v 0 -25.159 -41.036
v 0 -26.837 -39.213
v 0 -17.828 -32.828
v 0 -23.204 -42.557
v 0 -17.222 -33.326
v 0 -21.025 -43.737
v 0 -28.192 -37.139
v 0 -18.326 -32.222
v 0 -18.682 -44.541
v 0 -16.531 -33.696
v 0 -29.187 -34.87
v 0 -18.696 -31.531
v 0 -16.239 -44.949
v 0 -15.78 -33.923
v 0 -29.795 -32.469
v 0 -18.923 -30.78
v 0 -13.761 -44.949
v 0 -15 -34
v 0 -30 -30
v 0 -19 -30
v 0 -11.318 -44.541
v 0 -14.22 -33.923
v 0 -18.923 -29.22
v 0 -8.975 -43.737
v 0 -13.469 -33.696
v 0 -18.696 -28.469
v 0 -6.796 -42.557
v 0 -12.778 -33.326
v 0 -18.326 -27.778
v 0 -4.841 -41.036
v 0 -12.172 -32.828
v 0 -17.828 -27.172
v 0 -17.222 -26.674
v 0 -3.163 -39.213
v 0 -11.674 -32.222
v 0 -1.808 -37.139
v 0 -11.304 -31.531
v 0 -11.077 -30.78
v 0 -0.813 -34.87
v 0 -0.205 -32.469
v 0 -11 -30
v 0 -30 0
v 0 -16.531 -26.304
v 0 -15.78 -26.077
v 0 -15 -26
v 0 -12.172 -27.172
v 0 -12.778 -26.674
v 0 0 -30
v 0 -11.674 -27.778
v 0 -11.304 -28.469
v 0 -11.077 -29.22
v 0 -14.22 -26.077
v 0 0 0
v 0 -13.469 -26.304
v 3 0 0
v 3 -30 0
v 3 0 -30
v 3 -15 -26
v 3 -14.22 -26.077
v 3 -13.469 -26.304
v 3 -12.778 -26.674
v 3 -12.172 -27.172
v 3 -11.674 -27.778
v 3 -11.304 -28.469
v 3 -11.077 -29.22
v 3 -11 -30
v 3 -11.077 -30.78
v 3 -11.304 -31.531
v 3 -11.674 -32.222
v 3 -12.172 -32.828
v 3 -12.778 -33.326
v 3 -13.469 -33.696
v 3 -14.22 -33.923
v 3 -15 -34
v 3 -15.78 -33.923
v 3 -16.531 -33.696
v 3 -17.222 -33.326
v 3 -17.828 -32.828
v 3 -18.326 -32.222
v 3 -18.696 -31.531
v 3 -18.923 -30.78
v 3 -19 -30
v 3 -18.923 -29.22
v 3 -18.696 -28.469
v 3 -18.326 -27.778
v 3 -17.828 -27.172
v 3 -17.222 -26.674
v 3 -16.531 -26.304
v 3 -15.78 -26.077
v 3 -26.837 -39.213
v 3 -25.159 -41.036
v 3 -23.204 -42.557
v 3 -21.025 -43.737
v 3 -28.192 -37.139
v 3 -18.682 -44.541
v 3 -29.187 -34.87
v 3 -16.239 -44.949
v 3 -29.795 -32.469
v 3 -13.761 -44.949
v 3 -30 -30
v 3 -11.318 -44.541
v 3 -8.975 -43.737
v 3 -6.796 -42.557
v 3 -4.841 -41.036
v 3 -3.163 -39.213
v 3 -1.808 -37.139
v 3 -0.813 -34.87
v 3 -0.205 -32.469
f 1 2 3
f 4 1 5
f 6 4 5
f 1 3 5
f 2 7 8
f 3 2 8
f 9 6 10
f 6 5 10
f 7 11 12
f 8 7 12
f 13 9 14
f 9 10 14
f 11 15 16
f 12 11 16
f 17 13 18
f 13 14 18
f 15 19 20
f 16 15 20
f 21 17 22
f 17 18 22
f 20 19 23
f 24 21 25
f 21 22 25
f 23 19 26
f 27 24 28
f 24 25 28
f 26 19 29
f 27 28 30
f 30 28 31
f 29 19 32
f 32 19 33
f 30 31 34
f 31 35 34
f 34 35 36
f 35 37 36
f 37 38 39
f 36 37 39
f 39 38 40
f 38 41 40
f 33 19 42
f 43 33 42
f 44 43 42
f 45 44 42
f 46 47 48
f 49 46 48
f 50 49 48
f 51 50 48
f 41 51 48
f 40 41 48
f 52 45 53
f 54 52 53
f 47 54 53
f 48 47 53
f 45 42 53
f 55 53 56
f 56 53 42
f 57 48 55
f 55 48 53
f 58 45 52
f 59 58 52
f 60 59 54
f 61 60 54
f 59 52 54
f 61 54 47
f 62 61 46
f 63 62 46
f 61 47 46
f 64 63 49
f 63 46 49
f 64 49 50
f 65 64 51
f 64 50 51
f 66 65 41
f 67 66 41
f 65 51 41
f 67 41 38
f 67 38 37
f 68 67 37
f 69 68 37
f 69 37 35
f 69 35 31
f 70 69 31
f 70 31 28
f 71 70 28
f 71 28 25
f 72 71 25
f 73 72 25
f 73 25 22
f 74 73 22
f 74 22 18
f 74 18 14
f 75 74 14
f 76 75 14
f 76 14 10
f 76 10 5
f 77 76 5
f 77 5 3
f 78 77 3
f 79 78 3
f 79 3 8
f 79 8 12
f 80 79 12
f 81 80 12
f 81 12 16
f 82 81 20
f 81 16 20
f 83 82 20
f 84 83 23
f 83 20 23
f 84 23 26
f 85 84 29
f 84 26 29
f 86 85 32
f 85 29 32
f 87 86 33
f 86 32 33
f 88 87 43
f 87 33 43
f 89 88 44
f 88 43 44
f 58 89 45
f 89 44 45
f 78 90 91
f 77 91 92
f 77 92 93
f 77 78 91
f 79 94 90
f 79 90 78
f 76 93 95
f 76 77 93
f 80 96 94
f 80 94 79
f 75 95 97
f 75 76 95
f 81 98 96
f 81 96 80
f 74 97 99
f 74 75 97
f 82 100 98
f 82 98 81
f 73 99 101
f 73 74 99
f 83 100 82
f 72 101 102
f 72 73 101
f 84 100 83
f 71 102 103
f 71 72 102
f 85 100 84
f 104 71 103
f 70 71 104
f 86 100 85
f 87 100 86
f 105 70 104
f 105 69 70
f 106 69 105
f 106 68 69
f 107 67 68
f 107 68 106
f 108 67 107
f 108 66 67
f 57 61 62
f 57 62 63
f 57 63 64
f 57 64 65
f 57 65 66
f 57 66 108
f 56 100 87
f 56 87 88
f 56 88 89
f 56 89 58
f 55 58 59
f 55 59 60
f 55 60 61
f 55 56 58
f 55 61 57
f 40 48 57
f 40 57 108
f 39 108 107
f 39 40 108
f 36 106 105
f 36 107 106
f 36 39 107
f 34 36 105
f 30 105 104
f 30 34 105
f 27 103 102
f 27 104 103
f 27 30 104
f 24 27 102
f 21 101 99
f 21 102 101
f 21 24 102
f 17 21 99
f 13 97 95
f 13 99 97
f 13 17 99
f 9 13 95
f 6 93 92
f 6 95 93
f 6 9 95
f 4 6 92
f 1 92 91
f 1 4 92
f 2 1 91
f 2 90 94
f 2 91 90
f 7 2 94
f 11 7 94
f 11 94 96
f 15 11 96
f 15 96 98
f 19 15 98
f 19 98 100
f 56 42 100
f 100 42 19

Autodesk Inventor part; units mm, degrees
ref_plane "YZ Plane" through (0, 0, 0) normal (1, 0, 0) x (0, 1, 0)
ref_plane "XZ Plane" through (0, 0, 0) normal (0, 1, 0) x (-1, 0, 0)
ref_plane "XY Plane" through (0, 0, 0) normal (0, 0, 1) x (1, 0, 0)
sketch "Boceto1" plane through (0, 0, 0) normal (1, 0, 0) x (0, 1, 0)
  line L0 (0, 0) -> (-30, 0)
  line L1 (-30, 0) -> (-30, -30)
  line L2 (-30, -30) -> (0, -30)
  line L3 (0, -30) -> (0, 0)
  circle A0 centre (-15, -30) radius 15
  dimension "d0" = 30
  dimension "d1" = 30
  dimension "d2" = 30
  dimension "d3" = 15
extrude "Extrusión1" add sketch "Boceto1" along normal blind 3
sketch "Boceto2" plane through (0, 0, 0) normal (-1, 0, 0) x (0, 0, 1)
  arc A0 (-30, 0) -> (-30, -30) centre (-30, -15) ccw projected
  circle A1 centre (-30, -15) radius 4
  point P0 (0, 0)
  dimension "d6" = 8
extrude "Extrusión2" cut sketch "Boceto2" against normal blind 5
properties part number "soporte vertical"
